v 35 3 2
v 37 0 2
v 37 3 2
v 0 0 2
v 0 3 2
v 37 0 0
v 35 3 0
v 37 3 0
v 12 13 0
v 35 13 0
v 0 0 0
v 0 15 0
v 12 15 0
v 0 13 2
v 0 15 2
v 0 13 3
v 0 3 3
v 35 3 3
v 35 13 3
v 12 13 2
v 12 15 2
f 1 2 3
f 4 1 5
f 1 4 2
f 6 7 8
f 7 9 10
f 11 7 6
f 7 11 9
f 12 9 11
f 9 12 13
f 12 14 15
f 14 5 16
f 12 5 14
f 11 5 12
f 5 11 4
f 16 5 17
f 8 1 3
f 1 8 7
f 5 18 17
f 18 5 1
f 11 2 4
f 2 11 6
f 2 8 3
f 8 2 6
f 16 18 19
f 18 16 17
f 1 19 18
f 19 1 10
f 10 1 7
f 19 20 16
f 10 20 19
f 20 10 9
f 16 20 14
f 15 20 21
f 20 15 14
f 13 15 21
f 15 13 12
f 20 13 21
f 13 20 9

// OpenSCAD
translate([2.5, 1.5, 1.0]) color([0.8553226195102233, 0.21877355907286744, 0.817120303018883]) cube([5, 3, 2], center=true);
translate([8.5, 1.5, 1.0]) color([0.6342064135522842, 0.9365197161897865, 0.6021704873486543]) cube([7, 3, 2], center=true);
translate([14.5, 1.5, 1.0]) color([0.07399689426047196, 0.12444372203200982, 0.18852062230064282]) cube([5, 3, 2], center=true);
translate([19.5, 1.5, 1.0]) color([0.830086131214745, 0.11969547265179015, 0.09153185315534418]) cube([5, 3, 2], center=true);
translate([24.5, 1.5, 1.0]) color([0.8338444305994857, 0.11604613837891842, 0.6055041702213623]) cube([5, 3, 2], center=true);
translate([29.5, 1.5, 1.0]) color([0.19459095568233187, 0.9706919132543499, 0.7181133264593419]) cube([5, 3, 2], center=true);
translate([34.5, 1.5, 1.0]) color([0.47923365392220396, 0.7271552294548347, 0.06108489585644861]) cube([5, 3, 2], center=true);
translate([3.5, 5.5, 1.5]) color([0.6793471949009788, 0.5442354114772292, 0.620599970977755]) cube([7, 5, 3], center=true);
translate([10.5, 5.5, 1.5]) color([0.8359026555711022, 0.07000430092833387, 0.07197168951426236]) cube([7, 5, 3], center=true);
translate([17.5, 5.5, 1.5]) color([0.3010615360013691, 0.43606864795325617, 0.06104243921962749]) cube([7, 5, 3], center=true);
translate([24.5, 5.5, 1.5]) color([0.46713122754826175, 0.5964849226245376, 0.6993231250959273]) cube([7, 5, 3], center=true);
translate([31.5, 5.5, 1.5]) color([0.39127619713064865, 0.2601332542192585, 0.9043986330300443]) cube([7, 5, 3], center=true);
translate([3.5, 10.5, 1.5]) color([0.47021616129820465, 0.9023042315131579, 0.5697685418235108]) cube([7, 5, 3], center=true);
translate([10.5, 10.5, 1.5]) color([0.6976970707821888, 0.2034146857749588, 0.7673483420763234]) cube([7, 5, 3], center=true);
translate([17.5, 10.5, 1.5]) color([0.7886482900098098, 0.1582086298273846, 0.16195407019788421]) cube([7, 5, 3], center=true);
translate([24.5, 10.5, 1.5]) color([0.5294742230377147, 0.11721284387105246, 0.9214183944636138]) cube([7, 5, 3], center=true);
translate([31.5, 10.5, 1.5]) color([0.6656058220179341, 0.01320375853497835, 0.6812806756042346]) cube([7, 5, 3], center=true);
translate([2.5, 14.0, 1.0]) color([0.9000980523907597, 0.8748046942695984, 0.9175111227590292]) cube([5, 2, 2], center=true);
translate([8.5, 14.0, 1.0]) color([0.6489334878113245, 0.38864224283144744, 0.6576161999324908]) cube([7, 2, 2], center=true);
